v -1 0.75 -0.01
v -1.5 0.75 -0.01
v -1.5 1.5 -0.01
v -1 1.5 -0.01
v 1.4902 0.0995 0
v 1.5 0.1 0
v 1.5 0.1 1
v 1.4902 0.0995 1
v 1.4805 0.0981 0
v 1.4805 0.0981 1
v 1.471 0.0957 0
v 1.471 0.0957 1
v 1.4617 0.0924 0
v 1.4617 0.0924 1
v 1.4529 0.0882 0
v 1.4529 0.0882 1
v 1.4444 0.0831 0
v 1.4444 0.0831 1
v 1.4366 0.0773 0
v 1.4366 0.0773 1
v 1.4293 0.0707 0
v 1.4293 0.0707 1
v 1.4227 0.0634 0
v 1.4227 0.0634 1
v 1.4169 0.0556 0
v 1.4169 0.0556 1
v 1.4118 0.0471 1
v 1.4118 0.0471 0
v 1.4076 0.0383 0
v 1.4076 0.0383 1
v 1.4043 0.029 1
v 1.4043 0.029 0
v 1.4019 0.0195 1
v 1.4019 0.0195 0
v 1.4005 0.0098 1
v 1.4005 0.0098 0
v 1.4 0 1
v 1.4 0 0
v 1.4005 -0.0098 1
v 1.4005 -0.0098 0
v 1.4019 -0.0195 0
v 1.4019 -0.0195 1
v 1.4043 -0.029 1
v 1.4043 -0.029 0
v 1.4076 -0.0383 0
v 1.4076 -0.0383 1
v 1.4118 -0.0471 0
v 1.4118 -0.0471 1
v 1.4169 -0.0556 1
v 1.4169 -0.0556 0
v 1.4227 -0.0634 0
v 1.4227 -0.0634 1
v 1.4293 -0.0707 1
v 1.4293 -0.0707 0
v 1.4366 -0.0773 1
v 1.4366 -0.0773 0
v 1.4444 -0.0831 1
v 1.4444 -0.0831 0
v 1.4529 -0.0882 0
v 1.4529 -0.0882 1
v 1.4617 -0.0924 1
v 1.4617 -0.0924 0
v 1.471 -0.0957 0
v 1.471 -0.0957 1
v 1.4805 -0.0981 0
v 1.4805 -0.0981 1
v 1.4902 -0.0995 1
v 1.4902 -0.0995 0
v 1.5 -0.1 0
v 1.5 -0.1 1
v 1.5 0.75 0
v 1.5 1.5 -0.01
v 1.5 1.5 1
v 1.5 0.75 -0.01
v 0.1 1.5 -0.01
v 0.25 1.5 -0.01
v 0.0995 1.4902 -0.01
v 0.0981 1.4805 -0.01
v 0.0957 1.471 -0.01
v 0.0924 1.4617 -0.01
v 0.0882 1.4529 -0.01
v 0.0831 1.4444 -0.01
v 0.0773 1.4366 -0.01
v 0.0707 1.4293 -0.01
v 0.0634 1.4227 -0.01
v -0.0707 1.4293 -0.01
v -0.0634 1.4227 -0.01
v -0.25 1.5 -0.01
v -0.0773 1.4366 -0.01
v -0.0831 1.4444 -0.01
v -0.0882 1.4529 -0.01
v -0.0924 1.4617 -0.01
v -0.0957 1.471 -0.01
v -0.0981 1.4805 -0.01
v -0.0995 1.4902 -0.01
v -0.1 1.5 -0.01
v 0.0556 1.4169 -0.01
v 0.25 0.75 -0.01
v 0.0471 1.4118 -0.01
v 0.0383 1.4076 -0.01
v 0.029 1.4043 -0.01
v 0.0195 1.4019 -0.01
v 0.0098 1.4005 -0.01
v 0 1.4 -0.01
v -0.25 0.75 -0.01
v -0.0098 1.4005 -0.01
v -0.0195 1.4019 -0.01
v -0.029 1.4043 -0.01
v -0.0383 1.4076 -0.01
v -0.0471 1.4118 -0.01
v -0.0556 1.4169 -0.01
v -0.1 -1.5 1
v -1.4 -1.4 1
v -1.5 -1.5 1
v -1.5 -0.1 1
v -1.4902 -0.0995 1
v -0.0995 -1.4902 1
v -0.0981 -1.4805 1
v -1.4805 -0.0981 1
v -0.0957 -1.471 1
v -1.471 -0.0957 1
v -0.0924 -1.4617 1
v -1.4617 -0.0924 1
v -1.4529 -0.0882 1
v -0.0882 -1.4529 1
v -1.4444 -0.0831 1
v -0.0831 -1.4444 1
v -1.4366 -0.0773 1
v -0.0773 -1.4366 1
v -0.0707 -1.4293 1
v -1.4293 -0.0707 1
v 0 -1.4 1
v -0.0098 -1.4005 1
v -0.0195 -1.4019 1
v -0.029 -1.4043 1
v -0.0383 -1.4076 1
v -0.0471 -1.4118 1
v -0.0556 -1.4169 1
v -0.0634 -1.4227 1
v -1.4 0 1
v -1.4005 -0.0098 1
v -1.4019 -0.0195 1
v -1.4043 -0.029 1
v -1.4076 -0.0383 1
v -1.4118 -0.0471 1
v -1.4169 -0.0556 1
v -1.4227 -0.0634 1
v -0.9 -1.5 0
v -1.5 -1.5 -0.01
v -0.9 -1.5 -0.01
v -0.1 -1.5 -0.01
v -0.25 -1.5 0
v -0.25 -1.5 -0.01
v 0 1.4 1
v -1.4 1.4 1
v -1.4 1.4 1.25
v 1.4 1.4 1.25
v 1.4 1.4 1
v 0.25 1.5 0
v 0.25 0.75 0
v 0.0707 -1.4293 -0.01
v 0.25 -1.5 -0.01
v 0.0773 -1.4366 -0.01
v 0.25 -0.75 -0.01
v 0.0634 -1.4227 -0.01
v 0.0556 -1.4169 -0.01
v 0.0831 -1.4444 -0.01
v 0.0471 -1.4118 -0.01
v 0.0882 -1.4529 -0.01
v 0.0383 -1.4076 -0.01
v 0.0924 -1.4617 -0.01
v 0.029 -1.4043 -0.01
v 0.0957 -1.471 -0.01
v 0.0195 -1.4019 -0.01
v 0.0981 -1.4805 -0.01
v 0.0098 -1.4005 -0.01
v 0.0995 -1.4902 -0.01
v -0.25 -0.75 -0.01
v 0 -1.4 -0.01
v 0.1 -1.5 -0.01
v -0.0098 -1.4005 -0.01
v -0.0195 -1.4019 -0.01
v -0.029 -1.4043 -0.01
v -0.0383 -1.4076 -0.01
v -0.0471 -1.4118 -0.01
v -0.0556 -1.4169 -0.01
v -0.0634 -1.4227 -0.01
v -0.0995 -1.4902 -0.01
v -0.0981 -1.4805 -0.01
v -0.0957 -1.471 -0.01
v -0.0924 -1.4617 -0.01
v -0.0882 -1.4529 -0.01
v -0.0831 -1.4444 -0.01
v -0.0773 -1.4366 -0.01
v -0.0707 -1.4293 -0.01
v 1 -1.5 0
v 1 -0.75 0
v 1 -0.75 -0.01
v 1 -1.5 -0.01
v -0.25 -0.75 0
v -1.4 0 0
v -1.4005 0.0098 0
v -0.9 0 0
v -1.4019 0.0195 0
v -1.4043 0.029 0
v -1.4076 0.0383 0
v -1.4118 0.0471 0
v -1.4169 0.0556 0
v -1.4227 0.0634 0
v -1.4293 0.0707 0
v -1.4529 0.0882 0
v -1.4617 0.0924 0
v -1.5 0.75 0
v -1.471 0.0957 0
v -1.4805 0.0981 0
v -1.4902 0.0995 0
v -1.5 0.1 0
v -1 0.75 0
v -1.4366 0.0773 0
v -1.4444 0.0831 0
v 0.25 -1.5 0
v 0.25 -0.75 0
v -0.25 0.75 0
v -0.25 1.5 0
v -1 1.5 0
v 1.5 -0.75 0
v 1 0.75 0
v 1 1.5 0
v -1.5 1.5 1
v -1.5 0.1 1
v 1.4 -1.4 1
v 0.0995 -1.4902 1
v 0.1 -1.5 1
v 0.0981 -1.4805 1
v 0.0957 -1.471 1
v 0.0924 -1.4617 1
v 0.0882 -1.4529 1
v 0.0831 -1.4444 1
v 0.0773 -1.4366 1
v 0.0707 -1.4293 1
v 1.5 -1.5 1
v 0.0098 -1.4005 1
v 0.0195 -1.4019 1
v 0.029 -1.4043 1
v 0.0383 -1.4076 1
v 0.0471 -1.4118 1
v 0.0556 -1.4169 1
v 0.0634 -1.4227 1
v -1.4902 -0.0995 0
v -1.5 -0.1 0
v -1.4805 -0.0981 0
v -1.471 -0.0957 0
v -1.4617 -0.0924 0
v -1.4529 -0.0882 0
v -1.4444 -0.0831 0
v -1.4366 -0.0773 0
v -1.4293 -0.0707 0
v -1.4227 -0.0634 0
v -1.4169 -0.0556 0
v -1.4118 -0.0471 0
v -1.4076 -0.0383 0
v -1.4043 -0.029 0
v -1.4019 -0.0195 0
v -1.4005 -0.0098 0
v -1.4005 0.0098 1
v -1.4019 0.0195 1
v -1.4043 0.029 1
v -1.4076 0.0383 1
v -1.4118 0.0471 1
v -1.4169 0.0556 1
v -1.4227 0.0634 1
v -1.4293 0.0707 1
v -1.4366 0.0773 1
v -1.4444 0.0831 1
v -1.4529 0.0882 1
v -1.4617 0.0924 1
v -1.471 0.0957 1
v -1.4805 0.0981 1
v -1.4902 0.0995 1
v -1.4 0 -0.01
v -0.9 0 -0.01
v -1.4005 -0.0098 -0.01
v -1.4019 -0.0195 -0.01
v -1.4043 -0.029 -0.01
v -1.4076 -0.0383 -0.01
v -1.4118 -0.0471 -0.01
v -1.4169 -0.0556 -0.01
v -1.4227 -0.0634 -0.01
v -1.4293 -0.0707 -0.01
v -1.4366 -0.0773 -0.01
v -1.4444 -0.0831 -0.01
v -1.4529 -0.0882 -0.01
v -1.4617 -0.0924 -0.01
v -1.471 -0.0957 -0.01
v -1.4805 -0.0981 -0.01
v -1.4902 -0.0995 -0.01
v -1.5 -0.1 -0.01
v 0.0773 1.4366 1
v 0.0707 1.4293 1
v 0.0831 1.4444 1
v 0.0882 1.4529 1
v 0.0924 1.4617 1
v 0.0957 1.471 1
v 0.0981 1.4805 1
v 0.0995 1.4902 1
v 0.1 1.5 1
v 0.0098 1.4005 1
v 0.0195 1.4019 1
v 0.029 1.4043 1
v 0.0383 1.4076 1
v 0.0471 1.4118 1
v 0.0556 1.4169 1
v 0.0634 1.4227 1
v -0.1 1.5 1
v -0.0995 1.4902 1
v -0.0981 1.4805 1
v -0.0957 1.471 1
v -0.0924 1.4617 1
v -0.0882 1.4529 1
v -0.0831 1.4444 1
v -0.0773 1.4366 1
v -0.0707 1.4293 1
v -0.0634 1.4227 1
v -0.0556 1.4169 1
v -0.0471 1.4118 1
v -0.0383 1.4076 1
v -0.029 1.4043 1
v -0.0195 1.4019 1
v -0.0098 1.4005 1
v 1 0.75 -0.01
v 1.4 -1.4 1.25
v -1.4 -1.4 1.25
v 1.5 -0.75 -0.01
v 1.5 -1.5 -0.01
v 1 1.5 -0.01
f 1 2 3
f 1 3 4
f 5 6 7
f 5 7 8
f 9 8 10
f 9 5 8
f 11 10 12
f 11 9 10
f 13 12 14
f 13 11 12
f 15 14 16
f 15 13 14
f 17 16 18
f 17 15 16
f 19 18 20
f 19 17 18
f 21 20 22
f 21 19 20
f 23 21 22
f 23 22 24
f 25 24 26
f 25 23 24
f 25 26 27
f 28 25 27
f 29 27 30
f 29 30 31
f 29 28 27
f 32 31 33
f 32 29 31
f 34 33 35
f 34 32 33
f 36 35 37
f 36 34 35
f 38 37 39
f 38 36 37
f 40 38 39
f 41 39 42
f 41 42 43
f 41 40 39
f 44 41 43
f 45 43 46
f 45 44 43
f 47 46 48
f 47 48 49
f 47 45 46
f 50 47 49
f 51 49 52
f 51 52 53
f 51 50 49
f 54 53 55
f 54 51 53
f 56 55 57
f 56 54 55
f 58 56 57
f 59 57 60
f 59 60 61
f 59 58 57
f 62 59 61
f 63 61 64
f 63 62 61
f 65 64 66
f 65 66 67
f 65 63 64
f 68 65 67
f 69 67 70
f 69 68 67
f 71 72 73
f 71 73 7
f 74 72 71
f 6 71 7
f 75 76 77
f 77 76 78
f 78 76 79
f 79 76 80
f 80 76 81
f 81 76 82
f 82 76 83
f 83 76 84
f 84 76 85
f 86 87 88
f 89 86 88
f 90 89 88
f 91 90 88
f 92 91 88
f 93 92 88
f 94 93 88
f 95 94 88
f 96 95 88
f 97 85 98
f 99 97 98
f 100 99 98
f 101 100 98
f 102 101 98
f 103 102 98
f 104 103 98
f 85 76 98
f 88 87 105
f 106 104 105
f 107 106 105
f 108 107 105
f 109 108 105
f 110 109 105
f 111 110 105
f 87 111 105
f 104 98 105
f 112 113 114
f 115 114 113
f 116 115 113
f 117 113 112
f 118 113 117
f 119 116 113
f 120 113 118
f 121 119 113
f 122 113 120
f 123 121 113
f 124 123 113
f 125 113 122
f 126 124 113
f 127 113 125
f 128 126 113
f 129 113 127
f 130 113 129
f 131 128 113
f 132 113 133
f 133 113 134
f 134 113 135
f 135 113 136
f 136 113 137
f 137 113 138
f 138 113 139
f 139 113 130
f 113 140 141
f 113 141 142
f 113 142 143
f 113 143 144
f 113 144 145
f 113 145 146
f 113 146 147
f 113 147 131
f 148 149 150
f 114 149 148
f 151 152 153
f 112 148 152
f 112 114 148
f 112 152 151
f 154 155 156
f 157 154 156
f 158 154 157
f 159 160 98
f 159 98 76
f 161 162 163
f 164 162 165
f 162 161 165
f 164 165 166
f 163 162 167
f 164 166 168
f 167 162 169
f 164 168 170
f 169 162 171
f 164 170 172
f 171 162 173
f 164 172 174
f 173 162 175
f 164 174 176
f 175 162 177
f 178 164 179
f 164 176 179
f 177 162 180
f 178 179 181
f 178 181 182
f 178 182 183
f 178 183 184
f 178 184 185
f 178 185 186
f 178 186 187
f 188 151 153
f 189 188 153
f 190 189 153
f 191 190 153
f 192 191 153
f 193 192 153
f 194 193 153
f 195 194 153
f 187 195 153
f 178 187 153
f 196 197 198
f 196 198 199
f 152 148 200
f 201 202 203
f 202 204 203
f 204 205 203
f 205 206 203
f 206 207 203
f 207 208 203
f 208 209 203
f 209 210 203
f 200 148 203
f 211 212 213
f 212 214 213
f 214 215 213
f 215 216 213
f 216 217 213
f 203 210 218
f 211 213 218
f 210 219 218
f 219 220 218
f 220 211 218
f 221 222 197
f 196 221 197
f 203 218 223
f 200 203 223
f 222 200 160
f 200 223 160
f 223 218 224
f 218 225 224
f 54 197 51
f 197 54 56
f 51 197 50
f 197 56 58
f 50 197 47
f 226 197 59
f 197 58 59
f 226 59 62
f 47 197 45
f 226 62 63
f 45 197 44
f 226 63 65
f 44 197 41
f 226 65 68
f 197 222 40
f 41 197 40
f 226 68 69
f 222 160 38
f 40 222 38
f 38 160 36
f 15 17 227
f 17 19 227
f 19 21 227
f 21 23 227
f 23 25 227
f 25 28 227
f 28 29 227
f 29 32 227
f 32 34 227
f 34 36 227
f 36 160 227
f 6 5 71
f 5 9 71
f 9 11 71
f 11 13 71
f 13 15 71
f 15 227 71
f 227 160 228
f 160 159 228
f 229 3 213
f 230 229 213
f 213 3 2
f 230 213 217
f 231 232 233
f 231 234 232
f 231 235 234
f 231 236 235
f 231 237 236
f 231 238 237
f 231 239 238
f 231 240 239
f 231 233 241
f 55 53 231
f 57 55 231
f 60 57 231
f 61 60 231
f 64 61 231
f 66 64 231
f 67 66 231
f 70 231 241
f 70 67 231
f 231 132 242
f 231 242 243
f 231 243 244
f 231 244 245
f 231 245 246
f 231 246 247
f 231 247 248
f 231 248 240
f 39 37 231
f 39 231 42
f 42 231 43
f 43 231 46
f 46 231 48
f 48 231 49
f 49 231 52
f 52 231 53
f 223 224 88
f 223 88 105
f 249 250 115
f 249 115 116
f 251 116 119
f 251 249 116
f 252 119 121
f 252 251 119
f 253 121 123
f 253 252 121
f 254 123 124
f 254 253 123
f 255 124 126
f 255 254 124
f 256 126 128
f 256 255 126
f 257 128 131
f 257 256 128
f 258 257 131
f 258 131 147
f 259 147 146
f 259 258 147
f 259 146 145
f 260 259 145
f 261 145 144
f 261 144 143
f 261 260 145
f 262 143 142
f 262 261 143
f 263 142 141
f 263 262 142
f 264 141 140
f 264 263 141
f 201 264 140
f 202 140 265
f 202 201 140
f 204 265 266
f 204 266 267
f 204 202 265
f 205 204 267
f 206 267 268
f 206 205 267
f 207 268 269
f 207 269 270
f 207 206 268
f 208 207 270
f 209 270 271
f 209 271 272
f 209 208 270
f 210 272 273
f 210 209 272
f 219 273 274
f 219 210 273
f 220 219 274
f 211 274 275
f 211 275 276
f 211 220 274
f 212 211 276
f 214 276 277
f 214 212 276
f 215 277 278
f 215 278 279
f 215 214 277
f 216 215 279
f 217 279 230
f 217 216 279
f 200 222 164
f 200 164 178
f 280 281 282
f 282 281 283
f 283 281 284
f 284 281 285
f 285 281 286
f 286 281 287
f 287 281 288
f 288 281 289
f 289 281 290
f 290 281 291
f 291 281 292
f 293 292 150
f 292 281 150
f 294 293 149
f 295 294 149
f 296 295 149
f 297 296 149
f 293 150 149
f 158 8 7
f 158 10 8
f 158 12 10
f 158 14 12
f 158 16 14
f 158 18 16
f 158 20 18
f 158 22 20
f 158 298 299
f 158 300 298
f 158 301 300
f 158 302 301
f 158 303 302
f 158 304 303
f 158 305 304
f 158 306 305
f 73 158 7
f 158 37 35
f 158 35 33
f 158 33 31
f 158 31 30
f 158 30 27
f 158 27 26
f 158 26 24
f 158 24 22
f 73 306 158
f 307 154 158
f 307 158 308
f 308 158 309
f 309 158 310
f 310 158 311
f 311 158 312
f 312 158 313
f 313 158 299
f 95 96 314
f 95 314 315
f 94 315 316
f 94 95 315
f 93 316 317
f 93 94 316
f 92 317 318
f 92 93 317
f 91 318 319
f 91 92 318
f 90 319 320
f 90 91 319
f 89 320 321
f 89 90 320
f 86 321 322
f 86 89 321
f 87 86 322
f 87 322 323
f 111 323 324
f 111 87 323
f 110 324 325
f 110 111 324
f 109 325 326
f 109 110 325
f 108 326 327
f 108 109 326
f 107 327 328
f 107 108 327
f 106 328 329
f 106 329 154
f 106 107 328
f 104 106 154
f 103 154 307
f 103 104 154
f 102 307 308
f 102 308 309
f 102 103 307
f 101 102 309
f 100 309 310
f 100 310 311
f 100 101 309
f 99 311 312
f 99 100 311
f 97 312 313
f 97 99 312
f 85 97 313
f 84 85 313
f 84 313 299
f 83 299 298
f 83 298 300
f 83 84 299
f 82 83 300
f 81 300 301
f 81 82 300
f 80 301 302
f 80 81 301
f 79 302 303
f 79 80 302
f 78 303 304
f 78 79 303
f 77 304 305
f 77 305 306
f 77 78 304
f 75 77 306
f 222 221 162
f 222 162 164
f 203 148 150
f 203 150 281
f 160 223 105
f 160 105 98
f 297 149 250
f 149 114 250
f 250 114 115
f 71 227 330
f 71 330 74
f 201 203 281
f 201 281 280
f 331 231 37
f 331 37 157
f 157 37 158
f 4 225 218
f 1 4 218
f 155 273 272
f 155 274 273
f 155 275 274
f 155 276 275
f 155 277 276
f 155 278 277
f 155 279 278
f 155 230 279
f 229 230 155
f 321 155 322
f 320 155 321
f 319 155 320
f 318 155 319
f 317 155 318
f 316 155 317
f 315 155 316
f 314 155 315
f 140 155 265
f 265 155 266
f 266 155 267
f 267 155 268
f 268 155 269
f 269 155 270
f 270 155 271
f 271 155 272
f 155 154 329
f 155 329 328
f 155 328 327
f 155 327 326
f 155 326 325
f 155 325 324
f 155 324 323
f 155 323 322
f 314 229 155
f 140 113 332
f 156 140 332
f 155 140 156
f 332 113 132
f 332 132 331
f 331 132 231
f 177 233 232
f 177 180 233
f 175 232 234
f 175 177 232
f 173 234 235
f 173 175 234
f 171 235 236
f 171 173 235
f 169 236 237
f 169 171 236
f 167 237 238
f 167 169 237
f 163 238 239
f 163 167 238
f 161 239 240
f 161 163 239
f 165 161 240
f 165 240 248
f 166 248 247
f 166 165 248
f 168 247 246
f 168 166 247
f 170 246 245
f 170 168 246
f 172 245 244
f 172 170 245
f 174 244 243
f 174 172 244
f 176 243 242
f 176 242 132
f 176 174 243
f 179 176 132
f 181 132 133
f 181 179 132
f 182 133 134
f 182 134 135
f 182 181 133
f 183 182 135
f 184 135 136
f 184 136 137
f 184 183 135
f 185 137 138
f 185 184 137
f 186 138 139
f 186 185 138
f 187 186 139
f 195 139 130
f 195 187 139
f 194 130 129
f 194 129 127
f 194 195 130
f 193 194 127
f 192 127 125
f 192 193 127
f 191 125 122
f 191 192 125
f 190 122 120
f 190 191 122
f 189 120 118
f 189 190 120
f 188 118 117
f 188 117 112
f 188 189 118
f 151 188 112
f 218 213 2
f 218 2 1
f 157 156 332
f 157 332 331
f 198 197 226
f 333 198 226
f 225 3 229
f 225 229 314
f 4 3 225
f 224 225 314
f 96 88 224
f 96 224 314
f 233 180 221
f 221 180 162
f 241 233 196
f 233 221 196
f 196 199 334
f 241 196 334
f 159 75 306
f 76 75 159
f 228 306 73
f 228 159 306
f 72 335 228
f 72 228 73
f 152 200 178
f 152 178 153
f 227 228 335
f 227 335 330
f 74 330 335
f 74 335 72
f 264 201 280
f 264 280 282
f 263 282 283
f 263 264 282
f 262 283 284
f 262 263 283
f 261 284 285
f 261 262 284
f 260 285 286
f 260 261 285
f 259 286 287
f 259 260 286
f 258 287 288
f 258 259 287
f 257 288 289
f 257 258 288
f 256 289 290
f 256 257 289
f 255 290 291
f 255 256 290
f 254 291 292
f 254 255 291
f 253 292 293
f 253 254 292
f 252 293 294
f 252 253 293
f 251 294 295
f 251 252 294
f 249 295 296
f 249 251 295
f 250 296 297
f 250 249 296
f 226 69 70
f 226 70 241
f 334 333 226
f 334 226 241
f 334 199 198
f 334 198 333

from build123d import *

# Parameters (mm, degrees)
PAD_DEPTH    = 1
SKETCH001_W  = 2.8
SKETCH001_H  = 2.8
PAD001_DEPTH = 0.25
SKETCH002_W  = 0.5
SKETCH002_H  = 0.75
PAD002_DEPTH = 0.01


with BuildPart() as part:
    # Sketch → Pad (new body)
    with BuildSketch(Plane.XY):
        with BuildLine():
            Line((-1.5, -1.5), (-0.1, -1.5))
            ThreePointArc((0.1, -1.5), (0, -1.4), (-0.1, -1.5))
            Line((0.1, -1.5), (1.5, -1.5))
            Line((1.5, -0.1), (1.5, -1.5))
            ThreePointArc((1.5, 0.1), (1.4, 0), (1.5, -0.1))
            Line((1.5, 1.5), (1.5, 0.1))
            Line((0.1, 1.5), (1.5, 1.5))
            ThreePointArc((-0.1, 1.5), (0, 1.4), (0.1, 1.5))
            Line((-1.5, 1.5), (-0.1, 1.5))
            Line((-1.5, 1.5), (-1.5, 0.1))
            ThreePointArc((-1.5, -0.1), (-1.4, 0), (-1.5, 0.1))
            Line((-1.5, -0.1), (-1.5, -1.5))
        make_face()
    extrude(amount=PAD_DEPTH)

    # Sketch001 (on Face14 of Pad) → Pad001 (join)
    with BuildSketch(Plane.XY.offset(1)):
        Rectangle(SKETCH001_W, SKETCH001_H)
    extrude(amount=PAD001_DEPTH)

    # Sketch002 (on Face4 of Pad001) → Pad002 (join)
    with BuildSketch(Plane(origin=(0, 0, 0), x_dir=(1, 0, 0), z_dir=(0, 0, -1))):
        with BuildLine():
            Line((-1.5, 1.5), (-0.9, 1.5))
            Line((-0.9, 1.5), (-0.9, 0))
            Line((-0.9, 0), (-1.4, 0))
            ThreePointArc((-1.4, 0), (-1.429289, 0.070711), (-1.5, 0.1))
            Line((-1.5, 1.5), (-1.5, 0.1))
        make_face()
        with BuildLine():
            Line((0.25, 0.75), (-0.25, 0.75))
            Line((-0.25, 0.75), (-0.25, 1.5))
            Line((-0.25, 1.5), (-0.1, 1.5))
            ThreePointArc((-0.1, 1.5), (0, 1.4), (0.1, 1.5))
            Line((0.1, 1.5), (0.25, 1.5))
            Line((0.25, 1.5), (0.25, 0.75))
        make_face()
        with Locations((1.25, 1.125)):
            Rectangle(SKETCH002_W, SKETCH002_H)
        with Locations((1.25, -1.125)):
            Rectangle(SKETCH002_W, SKETCH002_H)
        with BuildLine():
            Line((-0.25, -1.5), (-0.25, -0.75))
            Line((-0.25, -0.75), (0.25, -0.75))
            Line((0.25, -0.75), (0.25, -1.5))
            Line((0.25, -1.5), (0.1, -1.5))
            ThreePointArc((0.1, -1.5), (0, -1.4), (-0.1, -1.5))
            Line((-0.1, -1.5), (-0.25, -1.5))
        make_face()
        with Locations((-1.25, -1.125)):
            Rectangle(SKETCH002_W, SKETCH002_H)
    extrude(amount=PAD002_DEPTH)


solid = part.part
